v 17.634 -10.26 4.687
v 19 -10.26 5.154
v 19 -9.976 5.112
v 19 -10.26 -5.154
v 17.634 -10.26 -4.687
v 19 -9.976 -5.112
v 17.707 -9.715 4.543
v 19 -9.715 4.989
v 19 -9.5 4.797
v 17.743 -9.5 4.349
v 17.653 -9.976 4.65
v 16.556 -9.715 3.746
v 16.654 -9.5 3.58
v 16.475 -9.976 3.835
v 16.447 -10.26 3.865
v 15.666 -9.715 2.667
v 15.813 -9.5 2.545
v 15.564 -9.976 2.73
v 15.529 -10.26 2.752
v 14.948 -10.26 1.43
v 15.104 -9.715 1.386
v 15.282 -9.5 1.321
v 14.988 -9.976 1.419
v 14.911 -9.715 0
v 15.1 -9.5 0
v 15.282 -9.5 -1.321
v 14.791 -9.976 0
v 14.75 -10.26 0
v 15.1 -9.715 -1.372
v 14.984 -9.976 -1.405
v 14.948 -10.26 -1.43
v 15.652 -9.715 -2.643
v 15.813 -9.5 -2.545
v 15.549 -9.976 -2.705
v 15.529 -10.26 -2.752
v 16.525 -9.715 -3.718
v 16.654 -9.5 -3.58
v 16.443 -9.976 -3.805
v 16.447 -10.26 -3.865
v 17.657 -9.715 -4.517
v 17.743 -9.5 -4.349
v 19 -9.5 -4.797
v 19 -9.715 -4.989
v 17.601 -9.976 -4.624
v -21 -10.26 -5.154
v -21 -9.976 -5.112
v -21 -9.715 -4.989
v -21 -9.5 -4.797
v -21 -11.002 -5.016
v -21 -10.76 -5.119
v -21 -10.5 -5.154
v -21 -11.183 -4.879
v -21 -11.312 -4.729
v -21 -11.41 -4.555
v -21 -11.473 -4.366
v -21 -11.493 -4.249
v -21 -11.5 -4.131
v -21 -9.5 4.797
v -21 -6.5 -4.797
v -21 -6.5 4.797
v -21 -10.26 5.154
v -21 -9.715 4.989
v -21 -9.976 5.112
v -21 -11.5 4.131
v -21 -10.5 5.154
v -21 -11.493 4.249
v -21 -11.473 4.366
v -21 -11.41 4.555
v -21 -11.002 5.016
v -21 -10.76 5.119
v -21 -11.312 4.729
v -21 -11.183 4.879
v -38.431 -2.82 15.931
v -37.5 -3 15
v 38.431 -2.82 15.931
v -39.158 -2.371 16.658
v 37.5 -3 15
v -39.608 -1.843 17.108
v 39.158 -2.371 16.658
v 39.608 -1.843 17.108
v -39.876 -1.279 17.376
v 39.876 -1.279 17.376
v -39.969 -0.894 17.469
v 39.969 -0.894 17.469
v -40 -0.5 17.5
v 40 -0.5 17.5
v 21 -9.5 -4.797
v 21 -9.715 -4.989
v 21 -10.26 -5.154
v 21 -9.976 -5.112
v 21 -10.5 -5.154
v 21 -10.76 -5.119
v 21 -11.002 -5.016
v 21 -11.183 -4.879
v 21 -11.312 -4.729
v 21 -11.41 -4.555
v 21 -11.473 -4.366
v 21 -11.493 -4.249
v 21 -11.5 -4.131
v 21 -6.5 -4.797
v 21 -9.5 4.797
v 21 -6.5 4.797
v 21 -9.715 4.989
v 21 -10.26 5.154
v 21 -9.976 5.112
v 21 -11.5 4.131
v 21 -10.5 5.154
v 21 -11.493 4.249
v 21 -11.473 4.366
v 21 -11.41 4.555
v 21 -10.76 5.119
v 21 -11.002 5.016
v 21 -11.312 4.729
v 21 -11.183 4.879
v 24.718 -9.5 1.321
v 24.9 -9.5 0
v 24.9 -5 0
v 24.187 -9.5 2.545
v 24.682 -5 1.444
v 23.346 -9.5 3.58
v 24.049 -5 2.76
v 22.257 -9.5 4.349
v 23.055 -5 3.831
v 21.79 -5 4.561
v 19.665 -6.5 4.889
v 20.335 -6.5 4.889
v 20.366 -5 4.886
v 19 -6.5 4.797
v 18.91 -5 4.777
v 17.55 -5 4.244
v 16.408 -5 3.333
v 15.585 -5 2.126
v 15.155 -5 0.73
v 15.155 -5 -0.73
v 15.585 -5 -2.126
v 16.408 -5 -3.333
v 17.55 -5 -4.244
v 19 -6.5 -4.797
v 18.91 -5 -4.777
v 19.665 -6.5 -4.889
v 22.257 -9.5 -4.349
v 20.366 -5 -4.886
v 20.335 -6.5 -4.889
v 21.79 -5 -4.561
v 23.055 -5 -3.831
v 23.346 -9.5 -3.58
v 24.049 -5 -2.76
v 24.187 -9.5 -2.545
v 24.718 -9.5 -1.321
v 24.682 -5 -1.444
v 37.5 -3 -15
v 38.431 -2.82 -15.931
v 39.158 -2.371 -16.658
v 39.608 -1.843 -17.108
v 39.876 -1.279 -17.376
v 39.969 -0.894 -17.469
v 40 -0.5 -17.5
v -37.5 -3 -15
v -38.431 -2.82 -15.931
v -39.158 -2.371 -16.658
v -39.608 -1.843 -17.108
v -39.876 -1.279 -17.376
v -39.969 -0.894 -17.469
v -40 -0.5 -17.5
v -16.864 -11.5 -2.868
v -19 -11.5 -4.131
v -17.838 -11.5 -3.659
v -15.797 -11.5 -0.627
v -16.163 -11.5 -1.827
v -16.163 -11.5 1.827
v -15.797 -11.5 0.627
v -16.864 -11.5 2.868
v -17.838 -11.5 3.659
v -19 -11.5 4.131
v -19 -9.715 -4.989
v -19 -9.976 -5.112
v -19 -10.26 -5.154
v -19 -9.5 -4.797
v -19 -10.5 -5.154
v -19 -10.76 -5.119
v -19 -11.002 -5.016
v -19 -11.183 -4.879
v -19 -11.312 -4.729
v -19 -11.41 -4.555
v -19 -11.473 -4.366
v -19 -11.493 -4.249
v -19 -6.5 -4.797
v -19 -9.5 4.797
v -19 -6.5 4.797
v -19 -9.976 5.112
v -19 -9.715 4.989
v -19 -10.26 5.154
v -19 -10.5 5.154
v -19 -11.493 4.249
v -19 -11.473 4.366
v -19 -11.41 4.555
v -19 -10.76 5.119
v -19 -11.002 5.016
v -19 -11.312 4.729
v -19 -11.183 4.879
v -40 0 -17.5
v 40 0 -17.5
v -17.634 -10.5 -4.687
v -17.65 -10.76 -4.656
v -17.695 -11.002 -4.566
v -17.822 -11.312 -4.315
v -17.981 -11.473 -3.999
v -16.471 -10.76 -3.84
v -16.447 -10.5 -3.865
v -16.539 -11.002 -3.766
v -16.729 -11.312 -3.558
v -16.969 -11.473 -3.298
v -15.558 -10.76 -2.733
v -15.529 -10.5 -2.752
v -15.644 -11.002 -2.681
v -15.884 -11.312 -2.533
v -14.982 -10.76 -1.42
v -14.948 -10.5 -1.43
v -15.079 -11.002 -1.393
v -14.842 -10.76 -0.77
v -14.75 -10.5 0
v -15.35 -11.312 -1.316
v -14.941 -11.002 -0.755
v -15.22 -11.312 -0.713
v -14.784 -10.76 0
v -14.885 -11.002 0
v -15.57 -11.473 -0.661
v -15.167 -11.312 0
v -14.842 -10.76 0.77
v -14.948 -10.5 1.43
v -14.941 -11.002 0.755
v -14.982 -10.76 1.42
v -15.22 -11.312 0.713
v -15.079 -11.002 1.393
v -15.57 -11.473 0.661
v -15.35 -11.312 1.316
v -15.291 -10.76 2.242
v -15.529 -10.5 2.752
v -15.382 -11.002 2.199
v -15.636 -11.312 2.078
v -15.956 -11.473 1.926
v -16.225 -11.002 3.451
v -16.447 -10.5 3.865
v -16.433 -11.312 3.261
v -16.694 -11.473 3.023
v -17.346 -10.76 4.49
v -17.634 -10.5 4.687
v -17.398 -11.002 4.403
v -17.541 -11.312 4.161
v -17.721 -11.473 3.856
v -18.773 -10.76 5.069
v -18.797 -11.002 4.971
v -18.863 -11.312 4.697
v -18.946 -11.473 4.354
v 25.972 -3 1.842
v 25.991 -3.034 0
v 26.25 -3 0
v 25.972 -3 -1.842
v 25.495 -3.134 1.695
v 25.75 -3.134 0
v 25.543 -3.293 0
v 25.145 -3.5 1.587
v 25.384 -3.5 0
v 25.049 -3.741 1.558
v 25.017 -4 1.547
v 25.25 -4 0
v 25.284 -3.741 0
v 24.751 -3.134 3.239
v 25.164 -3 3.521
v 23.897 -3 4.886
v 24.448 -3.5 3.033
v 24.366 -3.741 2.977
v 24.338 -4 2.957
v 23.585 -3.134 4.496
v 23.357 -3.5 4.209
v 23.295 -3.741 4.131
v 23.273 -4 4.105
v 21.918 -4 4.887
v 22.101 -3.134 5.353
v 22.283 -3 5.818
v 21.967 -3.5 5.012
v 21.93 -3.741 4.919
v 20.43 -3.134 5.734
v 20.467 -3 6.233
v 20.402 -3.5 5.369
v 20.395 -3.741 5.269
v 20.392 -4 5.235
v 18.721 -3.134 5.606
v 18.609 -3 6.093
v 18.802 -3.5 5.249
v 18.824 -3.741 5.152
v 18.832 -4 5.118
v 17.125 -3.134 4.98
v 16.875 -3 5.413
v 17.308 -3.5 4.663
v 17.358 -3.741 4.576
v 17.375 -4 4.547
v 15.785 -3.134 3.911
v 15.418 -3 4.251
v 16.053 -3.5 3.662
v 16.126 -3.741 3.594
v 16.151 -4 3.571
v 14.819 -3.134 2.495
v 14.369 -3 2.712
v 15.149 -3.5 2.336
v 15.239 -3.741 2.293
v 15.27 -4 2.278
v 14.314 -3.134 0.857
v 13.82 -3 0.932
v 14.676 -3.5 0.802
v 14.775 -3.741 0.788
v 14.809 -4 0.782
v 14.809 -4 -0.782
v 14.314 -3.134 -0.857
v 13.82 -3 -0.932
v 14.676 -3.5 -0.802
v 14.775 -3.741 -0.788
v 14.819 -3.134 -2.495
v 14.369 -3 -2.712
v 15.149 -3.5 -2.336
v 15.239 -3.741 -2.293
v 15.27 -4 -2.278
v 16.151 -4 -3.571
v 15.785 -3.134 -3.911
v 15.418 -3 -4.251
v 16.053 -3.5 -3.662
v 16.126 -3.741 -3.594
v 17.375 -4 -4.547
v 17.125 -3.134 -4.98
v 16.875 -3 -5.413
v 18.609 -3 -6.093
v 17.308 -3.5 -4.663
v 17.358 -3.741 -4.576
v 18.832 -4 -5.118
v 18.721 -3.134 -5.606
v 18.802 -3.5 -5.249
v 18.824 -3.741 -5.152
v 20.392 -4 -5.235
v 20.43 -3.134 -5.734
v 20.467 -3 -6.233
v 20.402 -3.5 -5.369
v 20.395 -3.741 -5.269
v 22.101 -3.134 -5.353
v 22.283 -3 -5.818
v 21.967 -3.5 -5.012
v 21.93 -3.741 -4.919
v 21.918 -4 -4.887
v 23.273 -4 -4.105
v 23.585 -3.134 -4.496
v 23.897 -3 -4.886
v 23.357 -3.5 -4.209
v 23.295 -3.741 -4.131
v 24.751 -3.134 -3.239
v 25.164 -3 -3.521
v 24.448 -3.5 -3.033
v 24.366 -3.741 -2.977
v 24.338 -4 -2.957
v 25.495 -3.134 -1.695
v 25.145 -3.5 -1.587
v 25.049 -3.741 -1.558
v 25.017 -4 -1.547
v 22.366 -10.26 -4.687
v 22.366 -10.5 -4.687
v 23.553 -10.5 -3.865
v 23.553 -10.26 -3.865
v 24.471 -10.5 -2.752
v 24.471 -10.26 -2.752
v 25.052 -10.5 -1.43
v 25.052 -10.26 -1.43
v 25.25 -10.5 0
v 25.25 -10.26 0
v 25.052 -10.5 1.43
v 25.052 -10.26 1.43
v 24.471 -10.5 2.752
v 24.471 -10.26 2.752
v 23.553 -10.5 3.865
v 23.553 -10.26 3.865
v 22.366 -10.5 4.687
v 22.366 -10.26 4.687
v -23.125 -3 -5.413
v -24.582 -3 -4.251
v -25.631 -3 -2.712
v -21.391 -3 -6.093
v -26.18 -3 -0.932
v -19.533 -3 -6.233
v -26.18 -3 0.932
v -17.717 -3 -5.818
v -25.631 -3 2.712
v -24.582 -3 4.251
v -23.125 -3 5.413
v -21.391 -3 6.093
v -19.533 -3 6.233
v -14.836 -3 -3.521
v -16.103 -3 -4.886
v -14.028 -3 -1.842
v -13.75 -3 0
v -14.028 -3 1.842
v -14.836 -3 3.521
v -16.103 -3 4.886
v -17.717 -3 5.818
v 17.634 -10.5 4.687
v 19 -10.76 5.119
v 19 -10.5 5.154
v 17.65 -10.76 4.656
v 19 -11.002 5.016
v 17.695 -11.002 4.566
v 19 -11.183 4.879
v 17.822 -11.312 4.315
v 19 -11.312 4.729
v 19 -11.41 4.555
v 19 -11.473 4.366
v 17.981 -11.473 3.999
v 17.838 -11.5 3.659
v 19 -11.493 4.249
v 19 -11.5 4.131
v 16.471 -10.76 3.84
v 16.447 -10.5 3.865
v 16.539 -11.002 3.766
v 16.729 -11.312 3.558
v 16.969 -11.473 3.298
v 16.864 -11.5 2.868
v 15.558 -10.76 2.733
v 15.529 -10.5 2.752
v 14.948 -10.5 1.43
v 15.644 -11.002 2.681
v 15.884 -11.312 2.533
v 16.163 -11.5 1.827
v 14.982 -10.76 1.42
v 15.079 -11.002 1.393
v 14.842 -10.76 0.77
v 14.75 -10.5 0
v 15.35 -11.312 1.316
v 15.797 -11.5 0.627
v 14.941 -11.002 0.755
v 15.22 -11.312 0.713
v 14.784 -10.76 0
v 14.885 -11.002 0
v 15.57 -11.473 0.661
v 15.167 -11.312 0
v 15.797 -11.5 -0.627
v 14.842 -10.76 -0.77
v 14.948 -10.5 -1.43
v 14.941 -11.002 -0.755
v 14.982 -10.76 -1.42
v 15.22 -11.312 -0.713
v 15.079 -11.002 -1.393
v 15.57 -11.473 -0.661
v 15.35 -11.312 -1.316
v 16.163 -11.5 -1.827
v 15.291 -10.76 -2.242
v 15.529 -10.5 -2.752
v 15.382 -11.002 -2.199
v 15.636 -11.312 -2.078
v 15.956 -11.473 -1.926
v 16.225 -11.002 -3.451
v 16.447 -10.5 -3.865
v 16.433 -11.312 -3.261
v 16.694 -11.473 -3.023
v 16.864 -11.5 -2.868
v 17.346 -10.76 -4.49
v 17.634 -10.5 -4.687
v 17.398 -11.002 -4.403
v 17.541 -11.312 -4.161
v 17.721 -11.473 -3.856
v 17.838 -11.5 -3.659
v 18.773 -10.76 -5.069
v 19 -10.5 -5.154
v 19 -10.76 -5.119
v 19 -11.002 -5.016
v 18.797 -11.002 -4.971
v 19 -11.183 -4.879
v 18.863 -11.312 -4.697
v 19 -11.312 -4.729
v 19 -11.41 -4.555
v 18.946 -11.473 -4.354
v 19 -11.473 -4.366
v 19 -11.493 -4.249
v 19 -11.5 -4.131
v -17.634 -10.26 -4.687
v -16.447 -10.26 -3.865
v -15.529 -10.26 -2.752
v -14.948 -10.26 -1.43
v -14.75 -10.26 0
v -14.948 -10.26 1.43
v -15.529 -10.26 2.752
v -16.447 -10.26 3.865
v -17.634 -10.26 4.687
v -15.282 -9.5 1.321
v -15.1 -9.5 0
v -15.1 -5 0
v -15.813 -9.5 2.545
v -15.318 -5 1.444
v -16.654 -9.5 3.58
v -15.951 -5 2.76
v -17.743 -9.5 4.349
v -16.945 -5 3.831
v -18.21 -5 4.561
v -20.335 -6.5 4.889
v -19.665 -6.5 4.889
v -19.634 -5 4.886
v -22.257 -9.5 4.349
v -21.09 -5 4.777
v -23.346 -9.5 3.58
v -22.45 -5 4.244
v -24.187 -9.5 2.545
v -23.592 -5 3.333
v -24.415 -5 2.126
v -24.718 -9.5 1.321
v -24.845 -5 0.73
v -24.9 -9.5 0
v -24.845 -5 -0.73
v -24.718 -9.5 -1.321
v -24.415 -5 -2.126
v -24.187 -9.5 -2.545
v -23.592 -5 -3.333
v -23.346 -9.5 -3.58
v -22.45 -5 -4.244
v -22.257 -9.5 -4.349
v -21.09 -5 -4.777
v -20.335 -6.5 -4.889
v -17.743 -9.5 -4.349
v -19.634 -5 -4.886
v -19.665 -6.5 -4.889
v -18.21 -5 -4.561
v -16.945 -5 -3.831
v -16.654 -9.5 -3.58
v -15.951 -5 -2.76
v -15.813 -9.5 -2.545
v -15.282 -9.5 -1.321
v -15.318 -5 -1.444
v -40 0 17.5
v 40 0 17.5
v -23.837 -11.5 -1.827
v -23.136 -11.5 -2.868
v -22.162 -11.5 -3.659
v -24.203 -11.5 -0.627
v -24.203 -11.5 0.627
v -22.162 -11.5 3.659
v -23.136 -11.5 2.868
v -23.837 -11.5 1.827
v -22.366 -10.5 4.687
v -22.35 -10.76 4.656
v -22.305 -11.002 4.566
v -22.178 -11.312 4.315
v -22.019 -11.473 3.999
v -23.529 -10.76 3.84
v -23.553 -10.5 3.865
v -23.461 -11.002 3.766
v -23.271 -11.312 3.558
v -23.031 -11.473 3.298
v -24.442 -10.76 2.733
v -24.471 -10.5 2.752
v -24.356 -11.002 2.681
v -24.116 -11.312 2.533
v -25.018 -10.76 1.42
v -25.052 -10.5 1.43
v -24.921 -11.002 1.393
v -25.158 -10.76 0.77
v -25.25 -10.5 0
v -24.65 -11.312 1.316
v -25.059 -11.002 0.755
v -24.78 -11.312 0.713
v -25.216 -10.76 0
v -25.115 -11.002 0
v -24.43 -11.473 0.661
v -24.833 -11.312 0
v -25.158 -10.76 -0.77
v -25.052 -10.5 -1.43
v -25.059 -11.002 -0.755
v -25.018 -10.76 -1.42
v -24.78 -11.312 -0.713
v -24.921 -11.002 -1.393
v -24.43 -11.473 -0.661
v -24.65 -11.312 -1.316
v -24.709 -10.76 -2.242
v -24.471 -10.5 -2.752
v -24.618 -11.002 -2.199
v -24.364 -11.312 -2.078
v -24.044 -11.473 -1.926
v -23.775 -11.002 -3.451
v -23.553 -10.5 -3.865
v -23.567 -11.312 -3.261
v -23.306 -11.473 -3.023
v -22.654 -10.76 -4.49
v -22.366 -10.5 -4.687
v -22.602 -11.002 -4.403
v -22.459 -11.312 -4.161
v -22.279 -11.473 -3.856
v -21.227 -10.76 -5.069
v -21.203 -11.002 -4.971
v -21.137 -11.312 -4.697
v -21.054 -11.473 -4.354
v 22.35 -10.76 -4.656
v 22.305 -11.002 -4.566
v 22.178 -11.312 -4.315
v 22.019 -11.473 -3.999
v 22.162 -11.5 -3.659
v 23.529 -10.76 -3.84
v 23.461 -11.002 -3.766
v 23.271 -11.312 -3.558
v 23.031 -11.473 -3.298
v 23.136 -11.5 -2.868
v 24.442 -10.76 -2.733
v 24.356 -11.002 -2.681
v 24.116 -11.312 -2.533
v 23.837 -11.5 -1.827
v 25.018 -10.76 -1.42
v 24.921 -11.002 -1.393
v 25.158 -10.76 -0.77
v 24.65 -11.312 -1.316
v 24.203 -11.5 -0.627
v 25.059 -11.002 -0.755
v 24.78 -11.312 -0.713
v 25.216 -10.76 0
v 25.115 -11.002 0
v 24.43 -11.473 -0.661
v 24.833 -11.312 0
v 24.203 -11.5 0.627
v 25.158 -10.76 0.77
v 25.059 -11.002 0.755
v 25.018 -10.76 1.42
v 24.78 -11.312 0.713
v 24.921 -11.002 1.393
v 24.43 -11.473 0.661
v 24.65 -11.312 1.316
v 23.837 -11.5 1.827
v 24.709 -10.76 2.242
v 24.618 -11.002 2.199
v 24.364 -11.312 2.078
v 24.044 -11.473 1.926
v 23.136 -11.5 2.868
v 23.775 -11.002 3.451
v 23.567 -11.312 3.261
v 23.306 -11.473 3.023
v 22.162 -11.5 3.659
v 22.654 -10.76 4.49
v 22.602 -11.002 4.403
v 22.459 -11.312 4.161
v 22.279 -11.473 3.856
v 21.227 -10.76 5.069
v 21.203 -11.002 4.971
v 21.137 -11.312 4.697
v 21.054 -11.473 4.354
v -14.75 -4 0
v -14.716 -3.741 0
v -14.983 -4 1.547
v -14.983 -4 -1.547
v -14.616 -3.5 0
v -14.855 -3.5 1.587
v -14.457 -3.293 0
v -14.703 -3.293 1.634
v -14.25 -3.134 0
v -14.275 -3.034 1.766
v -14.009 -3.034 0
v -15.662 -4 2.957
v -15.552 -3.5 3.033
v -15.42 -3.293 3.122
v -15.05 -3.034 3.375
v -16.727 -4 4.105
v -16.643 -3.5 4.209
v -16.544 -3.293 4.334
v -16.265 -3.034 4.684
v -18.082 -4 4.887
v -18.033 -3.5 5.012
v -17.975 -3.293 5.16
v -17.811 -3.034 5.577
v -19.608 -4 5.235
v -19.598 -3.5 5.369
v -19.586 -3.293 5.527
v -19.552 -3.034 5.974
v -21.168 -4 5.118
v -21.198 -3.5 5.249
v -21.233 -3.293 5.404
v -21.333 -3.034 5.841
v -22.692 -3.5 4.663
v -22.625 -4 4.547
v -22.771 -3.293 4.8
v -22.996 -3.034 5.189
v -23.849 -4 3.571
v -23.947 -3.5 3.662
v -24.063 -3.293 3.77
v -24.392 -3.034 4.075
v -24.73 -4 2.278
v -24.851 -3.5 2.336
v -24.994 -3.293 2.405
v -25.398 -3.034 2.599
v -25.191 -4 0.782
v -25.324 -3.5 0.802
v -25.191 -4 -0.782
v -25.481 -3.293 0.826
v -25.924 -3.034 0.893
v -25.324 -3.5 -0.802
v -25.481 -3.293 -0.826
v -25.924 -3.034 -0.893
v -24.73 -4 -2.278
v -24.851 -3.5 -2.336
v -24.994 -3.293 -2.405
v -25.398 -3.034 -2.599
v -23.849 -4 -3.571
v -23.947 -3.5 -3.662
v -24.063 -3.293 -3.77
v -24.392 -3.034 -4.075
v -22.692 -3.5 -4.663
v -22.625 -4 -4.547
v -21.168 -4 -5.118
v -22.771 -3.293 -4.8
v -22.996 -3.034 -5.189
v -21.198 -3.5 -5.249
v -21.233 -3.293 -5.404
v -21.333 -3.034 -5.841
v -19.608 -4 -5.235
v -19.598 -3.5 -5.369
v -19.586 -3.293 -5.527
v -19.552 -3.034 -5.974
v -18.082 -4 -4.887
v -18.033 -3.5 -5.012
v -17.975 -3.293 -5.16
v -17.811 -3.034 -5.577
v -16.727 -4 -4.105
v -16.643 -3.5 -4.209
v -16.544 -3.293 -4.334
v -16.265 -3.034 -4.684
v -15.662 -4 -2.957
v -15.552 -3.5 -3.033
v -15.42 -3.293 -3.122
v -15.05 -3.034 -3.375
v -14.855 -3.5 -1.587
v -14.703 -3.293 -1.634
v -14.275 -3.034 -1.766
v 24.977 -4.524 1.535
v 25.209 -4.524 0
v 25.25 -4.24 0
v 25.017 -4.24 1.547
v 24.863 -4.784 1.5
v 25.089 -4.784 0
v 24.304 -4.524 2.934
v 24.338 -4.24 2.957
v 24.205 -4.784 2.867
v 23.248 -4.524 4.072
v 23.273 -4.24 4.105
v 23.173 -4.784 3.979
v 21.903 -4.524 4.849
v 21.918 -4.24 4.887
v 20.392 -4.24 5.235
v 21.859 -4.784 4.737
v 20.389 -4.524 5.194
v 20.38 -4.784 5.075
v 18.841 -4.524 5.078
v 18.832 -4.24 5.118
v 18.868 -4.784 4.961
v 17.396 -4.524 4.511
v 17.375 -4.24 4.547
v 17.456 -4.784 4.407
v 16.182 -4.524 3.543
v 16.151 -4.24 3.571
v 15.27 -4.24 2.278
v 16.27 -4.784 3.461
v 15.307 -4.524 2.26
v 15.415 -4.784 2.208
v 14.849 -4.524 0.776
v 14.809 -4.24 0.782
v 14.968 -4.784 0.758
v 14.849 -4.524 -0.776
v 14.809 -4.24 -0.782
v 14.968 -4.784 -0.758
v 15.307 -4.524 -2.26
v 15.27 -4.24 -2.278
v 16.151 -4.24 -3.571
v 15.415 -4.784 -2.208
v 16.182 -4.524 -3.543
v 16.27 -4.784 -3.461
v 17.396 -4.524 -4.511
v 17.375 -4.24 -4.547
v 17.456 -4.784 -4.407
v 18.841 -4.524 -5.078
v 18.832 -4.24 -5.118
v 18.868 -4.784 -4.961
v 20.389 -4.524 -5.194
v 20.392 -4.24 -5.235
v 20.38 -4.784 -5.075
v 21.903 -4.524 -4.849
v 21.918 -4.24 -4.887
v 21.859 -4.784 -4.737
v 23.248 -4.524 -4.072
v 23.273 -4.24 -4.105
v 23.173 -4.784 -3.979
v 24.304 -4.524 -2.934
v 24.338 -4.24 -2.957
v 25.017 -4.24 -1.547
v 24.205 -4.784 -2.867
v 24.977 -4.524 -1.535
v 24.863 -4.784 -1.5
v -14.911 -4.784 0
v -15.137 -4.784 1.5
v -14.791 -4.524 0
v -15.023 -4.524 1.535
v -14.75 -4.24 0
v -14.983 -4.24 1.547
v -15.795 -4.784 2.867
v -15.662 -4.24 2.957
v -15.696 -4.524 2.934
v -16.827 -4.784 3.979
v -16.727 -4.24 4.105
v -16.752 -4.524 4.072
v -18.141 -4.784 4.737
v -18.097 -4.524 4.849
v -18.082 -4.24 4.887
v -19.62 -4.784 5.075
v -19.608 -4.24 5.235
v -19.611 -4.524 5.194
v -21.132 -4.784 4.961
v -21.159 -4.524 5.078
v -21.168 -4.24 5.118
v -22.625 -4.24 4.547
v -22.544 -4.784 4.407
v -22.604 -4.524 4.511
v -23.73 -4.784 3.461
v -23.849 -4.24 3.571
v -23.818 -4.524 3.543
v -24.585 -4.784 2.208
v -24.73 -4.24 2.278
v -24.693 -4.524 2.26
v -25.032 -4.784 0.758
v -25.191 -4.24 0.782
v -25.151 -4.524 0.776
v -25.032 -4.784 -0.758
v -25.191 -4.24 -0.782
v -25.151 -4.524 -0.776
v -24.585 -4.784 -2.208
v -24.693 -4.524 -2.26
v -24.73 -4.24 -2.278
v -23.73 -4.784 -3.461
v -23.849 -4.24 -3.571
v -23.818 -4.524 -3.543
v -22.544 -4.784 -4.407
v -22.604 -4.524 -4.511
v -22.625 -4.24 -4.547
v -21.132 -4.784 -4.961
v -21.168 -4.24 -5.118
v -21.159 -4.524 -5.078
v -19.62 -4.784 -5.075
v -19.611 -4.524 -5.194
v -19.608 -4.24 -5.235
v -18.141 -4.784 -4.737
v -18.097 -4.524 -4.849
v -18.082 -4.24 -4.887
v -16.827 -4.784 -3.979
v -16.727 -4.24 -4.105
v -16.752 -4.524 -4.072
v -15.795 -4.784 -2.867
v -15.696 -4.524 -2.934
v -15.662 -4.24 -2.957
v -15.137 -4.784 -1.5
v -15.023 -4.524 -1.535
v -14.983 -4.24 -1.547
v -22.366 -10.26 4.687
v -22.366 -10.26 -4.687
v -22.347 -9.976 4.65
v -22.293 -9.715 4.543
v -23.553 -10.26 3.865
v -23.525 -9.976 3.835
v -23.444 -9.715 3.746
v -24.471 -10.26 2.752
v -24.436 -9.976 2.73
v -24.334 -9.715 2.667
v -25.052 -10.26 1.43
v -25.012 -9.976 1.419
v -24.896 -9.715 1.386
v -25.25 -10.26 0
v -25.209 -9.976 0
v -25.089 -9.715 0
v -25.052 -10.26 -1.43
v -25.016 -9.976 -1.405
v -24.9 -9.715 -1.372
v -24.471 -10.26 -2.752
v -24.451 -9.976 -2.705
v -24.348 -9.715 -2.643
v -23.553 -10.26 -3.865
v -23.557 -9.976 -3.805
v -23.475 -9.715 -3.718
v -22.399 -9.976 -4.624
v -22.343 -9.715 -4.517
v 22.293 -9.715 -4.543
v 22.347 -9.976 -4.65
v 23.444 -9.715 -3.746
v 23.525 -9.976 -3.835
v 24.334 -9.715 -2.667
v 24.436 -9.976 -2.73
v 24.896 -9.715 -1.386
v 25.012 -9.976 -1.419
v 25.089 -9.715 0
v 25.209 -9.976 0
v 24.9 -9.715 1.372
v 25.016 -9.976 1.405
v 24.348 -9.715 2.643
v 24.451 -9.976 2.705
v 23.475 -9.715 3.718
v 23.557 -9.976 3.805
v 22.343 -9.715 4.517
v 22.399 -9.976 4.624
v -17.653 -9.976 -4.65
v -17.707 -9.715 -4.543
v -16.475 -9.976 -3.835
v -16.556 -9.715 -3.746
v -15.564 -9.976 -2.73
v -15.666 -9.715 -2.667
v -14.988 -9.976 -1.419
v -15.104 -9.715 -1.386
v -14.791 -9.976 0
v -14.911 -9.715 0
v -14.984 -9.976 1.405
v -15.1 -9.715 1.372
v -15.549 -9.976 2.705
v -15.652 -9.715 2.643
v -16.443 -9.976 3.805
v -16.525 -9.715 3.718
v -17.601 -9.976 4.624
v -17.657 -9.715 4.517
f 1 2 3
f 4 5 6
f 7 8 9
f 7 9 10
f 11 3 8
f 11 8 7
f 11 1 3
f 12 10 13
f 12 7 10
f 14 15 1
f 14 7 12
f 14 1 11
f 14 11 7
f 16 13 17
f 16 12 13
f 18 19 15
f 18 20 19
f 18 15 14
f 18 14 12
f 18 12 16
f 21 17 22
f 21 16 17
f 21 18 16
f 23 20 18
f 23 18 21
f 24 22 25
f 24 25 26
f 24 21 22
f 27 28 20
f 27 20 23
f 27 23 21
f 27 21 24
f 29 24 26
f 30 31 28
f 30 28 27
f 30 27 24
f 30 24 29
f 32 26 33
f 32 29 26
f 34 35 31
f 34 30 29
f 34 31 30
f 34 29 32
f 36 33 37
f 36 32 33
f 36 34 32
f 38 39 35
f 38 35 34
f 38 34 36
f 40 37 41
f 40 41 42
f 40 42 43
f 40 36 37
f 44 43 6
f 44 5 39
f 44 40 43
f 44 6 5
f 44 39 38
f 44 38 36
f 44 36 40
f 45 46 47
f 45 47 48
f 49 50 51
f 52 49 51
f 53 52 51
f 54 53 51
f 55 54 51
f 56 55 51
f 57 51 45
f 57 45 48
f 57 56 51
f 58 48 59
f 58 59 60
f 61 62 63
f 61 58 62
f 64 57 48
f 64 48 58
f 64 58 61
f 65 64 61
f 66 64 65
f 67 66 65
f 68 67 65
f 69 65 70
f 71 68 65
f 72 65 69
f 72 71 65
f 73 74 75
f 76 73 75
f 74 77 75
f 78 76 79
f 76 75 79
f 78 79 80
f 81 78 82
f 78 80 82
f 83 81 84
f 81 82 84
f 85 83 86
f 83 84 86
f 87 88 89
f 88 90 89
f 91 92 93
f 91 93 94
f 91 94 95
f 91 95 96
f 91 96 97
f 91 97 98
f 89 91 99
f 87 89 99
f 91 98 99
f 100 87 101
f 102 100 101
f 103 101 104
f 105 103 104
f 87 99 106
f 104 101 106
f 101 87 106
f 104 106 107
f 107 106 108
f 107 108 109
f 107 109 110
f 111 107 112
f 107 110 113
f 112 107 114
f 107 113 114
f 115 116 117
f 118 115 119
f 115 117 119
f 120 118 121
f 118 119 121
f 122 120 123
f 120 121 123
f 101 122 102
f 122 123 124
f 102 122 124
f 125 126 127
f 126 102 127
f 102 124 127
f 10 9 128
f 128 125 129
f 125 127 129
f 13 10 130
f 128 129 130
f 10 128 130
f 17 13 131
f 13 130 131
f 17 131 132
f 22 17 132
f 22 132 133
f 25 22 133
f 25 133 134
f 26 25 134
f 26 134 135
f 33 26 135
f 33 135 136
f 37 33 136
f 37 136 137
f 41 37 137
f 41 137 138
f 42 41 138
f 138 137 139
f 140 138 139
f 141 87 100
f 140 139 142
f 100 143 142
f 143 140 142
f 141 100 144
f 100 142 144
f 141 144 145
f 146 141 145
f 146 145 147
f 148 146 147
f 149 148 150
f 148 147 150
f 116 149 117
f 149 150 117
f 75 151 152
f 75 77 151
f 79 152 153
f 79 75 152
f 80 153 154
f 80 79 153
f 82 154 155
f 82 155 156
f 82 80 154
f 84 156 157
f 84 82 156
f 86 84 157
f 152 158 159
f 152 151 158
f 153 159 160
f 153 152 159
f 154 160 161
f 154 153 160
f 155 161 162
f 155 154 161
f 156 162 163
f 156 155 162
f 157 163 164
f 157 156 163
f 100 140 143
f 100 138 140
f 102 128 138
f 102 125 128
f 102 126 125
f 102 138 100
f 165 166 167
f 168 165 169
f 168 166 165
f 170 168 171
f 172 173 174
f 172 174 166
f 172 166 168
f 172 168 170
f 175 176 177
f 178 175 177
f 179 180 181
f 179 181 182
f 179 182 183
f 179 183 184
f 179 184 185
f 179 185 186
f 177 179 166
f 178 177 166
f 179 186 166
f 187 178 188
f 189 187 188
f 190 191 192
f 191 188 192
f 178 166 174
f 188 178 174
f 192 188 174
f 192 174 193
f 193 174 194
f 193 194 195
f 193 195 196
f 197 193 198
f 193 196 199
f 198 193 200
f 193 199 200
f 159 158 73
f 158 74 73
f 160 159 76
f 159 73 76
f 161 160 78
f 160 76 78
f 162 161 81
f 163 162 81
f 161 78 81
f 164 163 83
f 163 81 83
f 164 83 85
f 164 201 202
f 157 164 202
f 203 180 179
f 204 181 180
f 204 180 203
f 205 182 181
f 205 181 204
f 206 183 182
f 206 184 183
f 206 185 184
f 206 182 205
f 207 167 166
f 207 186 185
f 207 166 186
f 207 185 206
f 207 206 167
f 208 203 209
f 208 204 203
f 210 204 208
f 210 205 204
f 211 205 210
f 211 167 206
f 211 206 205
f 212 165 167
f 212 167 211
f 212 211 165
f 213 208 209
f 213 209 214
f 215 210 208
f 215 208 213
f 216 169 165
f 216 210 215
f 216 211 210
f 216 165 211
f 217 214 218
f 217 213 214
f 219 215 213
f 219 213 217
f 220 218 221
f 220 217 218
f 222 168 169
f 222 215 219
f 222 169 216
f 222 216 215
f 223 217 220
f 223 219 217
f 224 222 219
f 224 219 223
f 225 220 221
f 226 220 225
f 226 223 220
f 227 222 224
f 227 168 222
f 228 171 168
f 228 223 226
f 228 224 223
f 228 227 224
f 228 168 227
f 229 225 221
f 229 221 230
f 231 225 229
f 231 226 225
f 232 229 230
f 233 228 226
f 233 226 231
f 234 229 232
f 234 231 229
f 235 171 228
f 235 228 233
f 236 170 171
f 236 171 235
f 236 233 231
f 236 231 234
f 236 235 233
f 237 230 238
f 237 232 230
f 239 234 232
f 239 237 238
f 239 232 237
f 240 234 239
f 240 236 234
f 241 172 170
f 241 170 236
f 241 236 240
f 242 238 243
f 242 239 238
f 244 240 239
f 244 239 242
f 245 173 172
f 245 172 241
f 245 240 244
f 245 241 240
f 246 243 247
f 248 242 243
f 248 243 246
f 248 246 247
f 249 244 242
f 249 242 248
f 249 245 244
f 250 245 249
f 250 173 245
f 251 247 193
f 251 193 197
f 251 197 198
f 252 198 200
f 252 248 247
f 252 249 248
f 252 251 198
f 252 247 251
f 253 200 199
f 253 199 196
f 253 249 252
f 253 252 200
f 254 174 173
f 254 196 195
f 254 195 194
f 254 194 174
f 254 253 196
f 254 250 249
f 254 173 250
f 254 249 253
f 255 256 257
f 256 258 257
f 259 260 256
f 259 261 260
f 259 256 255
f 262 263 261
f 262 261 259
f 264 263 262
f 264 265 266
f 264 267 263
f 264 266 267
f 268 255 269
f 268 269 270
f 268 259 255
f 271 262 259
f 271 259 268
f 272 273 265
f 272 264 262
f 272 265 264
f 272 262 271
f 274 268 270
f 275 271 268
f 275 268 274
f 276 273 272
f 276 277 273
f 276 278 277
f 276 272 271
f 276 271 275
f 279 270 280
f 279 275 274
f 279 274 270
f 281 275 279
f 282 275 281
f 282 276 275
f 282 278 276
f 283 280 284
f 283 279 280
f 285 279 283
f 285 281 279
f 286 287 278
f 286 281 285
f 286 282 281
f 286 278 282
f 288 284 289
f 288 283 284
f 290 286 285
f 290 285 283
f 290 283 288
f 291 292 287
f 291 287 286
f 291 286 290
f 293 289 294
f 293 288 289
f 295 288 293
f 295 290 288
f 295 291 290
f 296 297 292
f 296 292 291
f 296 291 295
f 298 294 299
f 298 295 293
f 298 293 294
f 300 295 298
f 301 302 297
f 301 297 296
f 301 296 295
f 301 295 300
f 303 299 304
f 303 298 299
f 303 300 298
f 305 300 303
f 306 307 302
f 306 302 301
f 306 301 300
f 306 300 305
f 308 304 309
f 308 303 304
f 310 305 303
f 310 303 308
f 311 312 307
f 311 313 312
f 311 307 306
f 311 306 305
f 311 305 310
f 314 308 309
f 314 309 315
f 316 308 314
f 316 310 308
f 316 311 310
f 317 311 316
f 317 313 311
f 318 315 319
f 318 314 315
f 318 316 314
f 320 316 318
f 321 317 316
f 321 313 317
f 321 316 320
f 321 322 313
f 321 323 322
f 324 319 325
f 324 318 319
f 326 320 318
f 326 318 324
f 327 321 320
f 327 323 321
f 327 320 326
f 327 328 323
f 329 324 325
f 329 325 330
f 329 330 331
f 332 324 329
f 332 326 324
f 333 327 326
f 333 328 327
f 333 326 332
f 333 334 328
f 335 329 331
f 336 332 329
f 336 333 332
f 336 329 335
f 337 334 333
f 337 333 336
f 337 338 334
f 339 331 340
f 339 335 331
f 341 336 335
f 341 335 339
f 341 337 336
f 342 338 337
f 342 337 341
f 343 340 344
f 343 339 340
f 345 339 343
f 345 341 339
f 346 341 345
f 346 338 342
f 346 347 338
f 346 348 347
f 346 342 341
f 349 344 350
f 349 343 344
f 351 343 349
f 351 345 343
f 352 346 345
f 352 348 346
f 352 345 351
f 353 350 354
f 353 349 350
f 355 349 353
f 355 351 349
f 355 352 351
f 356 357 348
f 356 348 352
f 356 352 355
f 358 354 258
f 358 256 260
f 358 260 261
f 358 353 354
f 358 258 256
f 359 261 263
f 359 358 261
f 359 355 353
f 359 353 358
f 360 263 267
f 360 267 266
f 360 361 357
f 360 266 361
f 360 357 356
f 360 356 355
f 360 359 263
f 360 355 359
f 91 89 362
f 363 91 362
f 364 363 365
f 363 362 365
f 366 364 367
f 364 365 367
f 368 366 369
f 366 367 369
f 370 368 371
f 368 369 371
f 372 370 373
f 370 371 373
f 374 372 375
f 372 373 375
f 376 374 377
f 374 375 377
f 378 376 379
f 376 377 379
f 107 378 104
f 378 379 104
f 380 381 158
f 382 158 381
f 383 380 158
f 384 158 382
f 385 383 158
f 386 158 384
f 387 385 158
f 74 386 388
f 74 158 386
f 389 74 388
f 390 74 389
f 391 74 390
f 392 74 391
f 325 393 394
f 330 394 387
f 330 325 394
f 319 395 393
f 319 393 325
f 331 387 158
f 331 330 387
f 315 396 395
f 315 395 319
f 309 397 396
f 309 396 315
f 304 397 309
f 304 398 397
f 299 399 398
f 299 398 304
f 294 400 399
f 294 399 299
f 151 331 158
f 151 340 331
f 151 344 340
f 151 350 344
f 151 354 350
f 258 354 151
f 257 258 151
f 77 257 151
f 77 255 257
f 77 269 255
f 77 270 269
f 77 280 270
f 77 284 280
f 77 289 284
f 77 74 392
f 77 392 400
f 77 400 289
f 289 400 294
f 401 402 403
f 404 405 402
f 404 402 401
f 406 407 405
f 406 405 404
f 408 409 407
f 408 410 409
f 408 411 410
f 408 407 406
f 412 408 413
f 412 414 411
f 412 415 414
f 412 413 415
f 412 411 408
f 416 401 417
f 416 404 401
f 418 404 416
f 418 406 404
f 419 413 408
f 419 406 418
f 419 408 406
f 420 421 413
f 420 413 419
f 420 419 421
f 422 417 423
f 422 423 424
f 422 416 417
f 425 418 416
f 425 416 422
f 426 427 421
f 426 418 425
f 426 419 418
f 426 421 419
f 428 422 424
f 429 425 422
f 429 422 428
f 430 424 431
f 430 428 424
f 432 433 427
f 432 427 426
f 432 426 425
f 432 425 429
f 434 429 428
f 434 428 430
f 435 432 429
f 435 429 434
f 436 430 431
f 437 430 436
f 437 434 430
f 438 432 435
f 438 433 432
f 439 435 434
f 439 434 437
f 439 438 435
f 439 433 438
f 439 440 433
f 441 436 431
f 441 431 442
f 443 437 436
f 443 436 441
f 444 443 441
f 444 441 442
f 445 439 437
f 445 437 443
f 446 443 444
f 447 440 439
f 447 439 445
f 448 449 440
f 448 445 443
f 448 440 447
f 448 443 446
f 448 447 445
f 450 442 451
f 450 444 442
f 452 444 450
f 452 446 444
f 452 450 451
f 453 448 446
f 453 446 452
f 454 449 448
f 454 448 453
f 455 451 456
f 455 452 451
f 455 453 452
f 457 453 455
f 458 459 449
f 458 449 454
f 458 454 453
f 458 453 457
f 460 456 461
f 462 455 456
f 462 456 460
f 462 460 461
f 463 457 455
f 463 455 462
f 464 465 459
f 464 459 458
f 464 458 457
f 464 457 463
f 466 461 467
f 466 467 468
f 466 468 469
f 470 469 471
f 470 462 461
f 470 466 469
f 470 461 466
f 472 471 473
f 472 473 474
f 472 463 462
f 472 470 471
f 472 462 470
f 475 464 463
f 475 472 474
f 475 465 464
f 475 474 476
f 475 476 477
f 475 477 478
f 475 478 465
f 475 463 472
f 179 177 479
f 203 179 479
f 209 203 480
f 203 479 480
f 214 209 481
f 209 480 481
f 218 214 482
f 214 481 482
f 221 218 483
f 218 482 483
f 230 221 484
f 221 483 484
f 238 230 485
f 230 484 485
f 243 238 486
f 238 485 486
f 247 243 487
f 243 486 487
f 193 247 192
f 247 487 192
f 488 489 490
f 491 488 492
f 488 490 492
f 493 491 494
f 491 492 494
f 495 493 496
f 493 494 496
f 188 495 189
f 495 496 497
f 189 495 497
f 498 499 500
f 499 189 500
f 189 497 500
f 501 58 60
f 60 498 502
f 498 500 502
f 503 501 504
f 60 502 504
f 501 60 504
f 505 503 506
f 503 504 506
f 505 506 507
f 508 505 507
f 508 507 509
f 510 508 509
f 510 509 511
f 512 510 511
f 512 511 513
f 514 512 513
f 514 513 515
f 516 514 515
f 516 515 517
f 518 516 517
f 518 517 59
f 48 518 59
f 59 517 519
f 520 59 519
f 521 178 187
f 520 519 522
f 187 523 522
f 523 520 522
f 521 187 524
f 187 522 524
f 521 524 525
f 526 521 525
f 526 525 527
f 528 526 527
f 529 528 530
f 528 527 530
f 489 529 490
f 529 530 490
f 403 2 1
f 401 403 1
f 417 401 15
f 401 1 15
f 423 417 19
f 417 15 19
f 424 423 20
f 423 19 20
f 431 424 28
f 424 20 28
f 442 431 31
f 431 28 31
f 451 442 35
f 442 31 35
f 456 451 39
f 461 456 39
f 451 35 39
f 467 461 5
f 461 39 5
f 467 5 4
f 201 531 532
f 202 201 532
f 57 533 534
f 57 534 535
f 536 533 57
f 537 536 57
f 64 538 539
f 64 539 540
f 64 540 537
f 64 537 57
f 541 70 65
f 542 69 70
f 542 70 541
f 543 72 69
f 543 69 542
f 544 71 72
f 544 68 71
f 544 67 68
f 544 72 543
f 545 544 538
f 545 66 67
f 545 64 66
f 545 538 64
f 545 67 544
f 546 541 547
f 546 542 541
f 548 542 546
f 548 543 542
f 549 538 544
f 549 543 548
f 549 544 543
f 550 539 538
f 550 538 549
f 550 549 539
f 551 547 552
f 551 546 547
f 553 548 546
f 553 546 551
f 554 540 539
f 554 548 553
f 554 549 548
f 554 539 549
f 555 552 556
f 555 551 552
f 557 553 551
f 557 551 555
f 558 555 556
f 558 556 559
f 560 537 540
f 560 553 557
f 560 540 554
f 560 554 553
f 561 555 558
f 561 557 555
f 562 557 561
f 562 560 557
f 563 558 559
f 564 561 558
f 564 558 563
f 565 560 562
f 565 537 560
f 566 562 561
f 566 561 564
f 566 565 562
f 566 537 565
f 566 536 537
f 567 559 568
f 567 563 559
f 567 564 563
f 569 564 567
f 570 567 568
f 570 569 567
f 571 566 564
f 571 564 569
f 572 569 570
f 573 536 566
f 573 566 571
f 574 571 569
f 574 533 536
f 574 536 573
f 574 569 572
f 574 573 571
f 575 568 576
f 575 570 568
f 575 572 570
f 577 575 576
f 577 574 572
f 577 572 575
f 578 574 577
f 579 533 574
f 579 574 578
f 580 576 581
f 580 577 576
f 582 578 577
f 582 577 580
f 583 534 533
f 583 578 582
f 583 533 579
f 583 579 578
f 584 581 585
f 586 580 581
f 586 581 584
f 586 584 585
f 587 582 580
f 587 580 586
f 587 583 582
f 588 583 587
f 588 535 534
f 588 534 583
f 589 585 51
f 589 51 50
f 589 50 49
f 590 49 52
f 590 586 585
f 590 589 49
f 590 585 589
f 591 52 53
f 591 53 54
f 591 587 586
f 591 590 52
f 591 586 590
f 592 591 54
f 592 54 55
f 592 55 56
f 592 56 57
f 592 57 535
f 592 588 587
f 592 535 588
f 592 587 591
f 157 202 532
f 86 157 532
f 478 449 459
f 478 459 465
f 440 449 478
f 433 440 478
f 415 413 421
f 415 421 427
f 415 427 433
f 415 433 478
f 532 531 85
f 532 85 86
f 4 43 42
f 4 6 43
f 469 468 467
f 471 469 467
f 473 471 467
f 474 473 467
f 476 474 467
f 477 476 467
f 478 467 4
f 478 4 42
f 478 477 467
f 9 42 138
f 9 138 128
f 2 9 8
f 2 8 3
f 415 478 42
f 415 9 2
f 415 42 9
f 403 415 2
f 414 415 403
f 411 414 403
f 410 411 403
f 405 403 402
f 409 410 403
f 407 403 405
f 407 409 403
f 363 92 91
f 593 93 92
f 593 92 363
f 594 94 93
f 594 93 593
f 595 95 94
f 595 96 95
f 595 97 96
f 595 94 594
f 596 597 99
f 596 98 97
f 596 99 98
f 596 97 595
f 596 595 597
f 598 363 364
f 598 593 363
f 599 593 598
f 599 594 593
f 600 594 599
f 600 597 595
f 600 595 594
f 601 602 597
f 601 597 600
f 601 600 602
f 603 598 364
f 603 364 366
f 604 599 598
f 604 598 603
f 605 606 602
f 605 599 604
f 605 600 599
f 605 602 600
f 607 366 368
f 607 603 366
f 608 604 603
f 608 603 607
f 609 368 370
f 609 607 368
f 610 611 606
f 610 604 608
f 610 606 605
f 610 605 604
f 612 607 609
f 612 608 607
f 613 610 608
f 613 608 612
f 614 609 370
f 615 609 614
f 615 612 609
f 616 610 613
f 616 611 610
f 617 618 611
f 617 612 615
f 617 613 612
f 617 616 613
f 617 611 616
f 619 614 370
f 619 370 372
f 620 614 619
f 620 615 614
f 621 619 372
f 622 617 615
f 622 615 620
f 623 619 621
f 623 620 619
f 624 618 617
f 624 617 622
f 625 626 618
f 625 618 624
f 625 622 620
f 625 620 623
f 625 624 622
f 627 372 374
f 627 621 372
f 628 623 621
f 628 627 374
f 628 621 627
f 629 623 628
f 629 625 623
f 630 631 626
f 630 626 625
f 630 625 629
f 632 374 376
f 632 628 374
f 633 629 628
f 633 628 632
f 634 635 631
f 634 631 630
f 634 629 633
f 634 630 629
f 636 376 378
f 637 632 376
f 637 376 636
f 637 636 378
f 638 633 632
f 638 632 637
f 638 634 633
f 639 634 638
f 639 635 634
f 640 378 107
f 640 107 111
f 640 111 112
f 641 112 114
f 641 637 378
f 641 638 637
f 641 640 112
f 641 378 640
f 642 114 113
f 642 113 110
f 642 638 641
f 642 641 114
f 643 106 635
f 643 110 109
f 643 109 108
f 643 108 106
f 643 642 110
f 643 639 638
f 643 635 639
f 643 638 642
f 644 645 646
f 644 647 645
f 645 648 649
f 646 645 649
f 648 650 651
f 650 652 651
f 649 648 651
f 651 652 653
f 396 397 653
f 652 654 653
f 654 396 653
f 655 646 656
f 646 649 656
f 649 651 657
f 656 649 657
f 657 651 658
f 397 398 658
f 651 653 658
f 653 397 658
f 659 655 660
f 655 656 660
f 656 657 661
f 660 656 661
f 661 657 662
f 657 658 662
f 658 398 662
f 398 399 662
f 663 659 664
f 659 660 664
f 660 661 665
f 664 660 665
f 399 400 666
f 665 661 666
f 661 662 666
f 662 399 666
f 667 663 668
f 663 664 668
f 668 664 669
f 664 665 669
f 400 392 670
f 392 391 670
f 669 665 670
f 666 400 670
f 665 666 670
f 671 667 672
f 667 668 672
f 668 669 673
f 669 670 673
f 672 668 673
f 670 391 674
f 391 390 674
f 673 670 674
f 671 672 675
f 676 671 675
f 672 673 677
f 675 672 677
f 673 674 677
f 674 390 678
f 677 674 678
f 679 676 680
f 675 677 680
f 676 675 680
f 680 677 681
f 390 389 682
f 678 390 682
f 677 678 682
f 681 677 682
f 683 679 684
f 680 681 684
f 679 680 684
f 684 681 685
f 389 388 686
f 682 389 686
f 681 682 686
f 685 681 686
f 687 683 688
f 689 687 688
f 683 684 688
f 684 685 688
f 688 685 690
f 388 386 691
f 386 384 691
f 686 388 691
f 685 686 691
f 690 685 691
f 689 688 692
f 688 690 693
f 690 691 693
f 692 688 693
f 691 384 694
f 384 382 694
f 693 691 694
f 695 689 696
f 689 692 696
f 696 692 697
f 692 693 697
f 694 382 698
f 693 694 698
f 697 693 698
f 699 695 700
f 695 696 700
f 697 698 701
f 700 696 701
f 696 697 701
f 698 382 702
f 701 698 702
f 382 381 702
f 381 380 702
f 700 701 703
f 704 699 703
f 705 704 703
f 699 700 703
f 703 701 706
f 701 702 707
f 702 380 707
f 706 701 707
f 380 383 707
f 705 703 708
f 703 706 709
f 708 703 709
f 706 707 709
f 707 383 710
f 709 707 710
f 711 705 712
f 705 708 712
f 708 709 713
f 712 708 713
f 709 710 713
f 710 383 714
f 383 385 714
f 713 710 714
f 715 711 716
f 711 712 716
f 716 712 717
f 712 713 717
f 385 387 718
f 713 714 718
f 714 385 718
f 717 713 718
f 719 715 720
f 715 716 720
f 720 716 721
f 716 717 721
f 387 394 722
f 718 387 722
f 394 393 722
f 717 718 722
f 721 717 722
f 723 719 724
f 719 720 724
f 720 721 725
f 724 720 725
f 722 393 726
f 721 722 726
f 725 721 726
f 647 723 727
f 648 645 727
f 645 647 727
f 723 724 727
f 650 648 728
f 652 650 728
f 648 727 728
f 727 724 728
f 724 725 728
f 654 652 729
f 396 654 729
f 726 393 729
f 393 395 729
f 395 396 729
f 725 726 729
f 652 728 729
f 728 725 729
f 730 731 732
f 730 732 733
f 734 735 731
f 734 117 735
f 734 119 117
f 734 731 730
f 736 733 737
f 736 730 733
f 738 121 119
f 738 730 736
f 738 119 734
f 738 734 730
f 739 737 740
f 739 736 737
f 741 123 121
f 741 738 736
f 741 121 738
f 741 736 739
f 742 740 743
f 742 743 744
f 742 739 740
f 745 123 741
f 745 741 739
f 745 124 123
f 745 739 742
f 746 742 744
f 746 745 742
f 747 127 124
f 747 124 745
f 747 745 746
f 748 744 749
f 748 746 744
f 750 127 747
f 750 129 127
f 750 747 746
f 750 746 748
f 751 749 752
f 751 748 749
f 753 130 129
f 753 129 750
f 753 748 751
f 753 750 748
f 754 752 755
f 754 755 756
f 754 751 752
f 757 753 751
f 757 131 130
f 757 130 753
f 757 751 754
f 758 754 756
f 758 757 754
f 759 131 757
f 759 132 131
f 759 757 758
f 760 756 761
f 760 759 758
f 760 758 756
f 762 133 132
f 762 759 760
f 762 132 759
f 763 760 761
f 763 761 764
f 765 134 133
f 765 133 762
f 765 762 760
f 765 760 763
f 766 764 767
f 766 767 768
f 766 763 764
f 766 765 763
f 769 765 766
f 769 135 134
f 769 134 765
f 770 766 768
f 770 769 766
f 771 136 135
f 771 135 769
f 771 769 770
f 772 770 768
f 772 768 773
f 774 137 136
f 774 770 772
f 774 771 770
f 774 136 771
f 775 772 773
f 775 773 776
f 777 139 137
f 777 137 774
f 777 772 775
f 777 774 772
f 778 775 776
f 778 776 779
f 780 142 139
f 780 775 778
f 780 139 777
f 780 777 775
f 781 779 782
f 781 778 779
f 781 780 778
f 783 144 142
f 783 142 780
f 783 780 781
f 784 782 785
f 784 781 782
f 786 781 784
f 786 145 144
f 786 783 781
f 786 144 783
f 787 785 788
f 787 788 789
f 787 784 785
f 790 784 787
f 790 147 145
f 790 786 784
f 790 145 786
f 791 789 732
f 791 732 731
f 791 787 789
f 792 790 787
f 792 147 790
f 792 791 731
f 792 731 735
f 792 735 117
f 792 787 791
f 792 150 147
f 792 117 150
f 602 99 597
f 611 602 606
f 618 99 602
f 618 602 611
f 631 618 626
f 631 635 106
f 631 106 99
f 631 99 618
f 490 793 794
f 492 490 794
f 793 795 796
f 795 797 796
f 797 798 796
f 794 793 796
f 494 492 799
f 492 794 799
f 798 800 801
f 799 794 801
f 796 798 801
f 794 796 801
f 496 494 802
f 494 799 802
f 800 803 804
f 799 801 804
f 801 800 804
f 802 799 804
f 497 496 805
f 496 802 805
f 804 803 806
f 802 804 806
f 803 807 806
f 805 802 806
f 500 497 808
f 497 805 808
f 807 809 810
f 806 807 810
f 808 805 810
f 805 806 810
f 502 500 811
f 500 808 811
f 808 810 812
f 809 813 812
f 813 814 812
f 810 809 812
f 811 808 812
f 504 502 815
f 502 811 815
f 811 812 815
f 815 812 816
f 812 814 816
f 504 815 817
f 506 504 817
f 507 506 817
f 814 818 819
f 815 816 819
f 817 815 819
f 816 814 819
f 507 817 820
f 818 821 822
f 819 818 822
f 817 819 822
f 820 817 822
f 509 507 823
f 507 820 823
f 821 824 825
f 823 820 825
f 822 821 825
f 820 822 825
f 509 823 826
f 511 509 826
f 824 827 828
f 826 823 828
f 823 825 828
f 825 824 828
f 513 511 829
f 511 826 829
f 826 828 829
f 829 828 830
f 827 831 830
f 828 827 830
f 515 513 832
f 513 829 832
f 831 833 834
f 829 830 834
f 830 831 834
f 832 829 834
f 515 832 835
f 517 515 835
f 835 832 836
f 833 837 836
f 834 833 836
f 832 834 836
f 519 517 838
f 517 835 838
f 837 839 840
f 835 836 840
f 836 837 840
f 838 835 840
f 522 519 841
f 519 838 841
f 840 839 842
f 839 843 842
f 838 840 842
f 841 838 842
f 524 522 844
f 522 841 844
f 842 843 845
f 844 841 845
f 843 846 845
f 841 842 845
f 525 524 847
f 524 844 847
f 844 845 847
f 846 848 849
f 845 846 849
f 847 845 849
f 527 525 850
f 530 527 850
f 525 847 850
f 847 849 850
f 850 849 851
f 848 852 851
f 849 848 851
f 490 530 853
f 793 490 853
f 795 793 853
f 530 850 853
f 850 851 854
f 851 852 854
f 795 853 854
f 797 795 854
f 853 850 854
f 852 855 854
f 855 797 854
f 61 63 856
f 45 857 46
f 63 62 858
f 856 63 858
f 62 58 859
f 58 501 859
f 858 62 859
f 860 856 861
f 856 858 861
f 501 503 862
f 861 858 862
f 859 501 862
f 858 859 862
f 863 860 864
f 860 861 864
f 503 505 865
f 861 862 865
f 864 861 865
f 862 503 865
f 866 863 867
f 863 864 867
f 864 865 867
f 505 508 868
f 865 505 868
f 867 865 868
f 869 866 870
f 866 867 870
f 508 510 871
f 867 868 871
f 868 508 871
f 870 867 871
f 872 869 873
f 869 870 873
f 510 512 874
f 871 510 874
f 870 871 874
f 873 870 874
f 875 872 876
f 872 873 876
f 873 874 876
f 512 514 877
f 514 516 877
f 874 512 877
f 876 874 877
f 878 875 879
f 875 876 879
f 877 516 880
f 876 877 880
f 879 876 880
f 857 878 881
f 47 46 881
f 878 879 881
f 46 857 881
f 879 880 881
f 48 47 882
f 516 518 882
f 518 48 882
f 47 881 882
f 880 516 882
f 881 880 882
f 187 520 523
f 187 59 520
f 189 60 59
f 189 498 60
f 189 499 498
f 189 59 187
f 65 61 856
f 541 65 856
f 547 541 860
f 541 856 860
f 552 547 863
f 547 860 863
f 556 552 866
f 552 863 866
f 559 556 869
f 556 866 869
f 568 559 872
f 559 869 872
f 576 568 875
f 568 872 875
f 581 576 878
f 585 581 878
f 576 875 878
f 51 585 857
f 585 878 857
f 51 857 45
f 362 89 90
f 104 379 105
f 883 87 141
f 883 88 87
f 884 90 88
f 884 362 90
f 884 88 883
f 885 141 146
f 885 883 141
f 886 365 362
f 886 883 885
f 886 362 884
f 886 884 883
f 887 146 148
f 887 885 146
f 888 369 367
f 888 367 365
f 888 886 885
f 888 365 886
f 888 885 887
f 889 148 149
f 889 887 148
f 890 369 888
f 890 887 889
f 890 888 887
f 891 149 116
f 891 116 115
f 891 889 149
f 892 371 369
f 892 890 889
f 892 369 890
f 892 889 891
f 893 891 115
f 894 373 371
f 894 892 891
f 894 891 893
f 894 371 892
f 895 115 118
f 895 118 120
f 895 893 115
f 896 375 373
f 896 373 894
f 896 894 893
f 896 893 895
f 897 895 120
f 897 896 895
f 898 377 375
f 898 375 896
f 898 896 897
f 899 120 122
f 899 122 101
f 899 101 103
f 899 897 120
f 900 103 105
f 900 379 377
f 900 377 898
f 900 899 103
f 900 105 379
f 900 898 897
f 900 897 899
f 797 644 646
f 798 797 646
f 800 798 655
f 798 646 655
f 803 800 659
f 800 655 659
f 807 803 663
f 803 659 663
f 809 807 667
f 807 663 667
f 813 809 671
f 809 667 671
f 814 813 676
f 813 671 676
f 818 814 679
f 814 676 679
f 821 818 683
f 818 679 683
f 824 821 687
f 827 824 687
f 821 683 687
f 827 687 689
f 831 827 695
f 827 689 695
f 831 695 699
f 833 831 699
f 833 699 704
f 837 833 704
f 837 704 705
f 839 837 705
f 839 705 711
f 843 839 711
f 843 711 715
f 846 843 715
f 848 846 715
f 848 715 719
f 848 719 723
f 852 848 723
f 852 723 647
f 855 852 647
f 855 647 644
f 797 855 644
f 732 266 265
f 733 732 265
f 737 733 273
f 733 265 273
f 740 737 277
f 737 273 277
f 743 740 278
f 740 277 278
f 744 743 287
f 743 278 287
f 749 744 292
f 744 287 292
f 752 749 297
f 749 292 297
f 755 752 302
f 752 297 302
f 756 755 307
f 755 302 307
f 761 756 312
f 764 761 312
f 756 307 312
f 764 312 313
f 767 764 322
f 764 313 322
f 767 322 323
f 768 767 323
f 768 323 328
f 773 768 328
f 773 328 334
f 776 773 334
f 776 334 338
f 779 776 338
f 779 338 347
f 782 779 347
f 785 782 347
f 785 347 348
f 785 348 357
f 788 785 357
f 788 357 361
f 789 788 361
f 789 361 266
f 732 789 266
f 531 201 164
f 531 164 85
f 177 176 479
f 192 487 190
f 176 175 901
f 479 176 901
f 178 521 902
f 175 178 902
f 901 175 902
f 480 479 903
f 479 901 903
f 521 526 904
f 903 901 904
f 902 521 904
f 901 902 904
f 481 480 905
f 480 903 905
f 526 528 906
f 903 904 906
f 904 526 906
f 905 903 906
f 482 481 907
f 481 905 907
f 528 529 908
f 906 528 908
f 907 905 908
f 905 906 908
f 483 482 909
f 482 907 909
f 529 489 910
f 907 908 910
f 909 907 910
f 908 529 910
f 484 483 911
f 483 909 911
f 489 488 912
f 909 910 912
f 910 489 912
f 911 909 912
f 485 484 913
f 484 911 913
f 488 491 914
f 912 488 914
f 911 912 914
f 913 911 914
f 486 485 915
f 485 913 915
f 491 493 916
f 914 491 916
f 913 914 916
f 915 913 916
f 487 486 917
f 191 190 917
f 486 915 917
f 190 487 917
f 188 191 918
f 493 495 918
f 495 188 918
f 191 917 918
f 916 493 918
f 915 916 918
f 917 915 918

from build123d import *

# Parameters (mm, degrees)
F0_W      = 80
F0_H      = 35
F1_DEPTH  = 3
F2_R      = 5.25
F3_DEPTH  = 2
F4_R      = 4.9
F5_DEPTH  = 4.5
F6_R      = 5.25
F7_DEPTH  = 2
F9_W      = 2
F9_H      = 15
F10_DEPTH = 5
F11_R     = 2.5


# Not quite as in the source:
# - a fillet or chamfer that OpenCascade refuses, or shapes differently, is made with other operations: its cross-section is extruded or revolved along the edge and cut away or added


with BuildPart() as f1:
    # F0 (on Front) → F1 (new body)
    with BuildSketch(Plane.XZ):
        Rectangle(F0_W, F0_H)
    extrude(amount=F1_DEPTH)

    # F2 (on face) → F3 (join)
    with BuildSketch(Plane.XZ.offset(3)):
        with Locations((-20, 0)):
            Circle(F2_R)
        with Locations((20, 0)):
            Circle(F2_R)
    extrude(amount=F3_DEPTH)

    # F4 (on face) → F5 (join)
    with BuildSketch(Plane.XZ.offset(5)):
        with Locations((-20, 0)):
            Circle(F4_R)
        with Locations((20, 0)):
            Circle(F4_R)
    extrude(amount=F5_DEPTH)

    # F6 (on face) → F7 (join)
    with BuildSketch(Plane.XZ.offset(9.5)):
        with Locations((-20, 0)):
            Circle(F6_R)
        with Locations((20, 0)):
            Circle(F6_R)
    extrude(amount=F7_DEPTH)

    # F8: fillet of radius 1 on 8 edges, made by hand

    # F8_s1 → F8_t2 (revolve)
    with BuildSketch(Plane.XY):
        with BuildLine():
            ThreePointArc((-14.75, -4), (-14.4571067812, -3.2928932188), (-13.75, -3))
            Line((-13.75, -3), (-14.75, -3))
            Line((-14.75, -3), (-14.75, -4))
        make_face()
    revolve(axis=Axis((-20, -3, 0), (0, -1, 0)))

    # F8_s3 → F8_t4 (revolve)
    with BuildSketch(Plane.XY):
        with BuildLine():
            ThreePointArc((26.25, -3), (25.5428932188, -3.2928932188), (25.25, -4))
            Line((25.25, -4), (25.25, -3))
            Line((25.25, -3), (26.25, -3))
        make_face()
    revolve(axis=Axis((20, -3, 0), (0, -1, 0)))

    # F8_s5 → F8_t6 (revolve, cut)
    with BuildSketch(Plane.XY):
        with BuildLine():
            ThreePointArc((-14.75, -10.2599342077), (-14.8417048938, -9.8416041944), (-15.1, -9.5))
            Line((-15.1, -9.5), (-14.75, -9.5))
            Line((-14.75, -9.5), (-14.75, -10.2599342077))
        make_face()
    revolve(axis=Axis((-20, -9.5, 0), (0, -1, 0)), mode=Mode.SUBTRACT)

    # F8_s7 → F8_t8 (revolve, cut)
    with BuildSketch(Plane.XY):
        with BuildLine():
            ThreePointArc((-14.75, -10.5), (-15.0428932188, -11.2071067812), (-15.75, -11.5))
            Line((-15.75, -11.5), (-14.75, -11.5))
            Line((-14.75, -11.5), (-14.75, -10.5))
        make_face()
    revolve(axis=Axis((-20, -11.5, 0), (0, -1, 0)), mode=Mode.SUBTRACT)

    # F8_s9 → F8_t10 (revolve, cut)
    with BuildSketch(Plane.XY):
        with BuildLine():
            ThreePointArc((-15.1, -5), (-14.8417048938, -4.6583958056), (-14.75, -4.2400657923))
            Line((-14.75, -4.2400657923), (-14.75, -5))
            Line((-14.75, -5), (-15.1, -5))
        make_face()
    revolve(axis=Axis((-20, -5, 0), (0, -1, 0)), mode=Mode.SUBTRACT)

    # F8_s11 → F8_t12 (revolve, cut)
    with BuildSketch(Plane.XY):
        with BuildLine():
            ThreePointArc((25.25, -4.2400657923), (25.1582951062, -4.6583958056), (24.9, -5))
            Line((24.9, -5), (25.25, -5))
            Line((25.25, -5), (25.25, -4.2400657923))
        make_face()
    revolve(axis=Axis((20, -5, 0), (0, -1, 0)), mode=Mode.SUBTRACT)

    # F8_s13 → F8_t14 (revolve, cut)
    with BuildSketch(Plane.XY):
        with BuildLine():
            ThreePointArc((24.9, -9.5), (25.1582951062, -9.8416041944), (25.25, -10.2599342077))
            Line((25.25, -10.2599342077), (25.25, -9.5))
            Line((25.25, -9.5), (24.9, -9.5))
        make_face()
    revolve(axis=Axis((20, -9.5, 0), (0, -1, 0)), mode=Mode.SUBTRACT)

    # F8_s15 → F8_t16 (revolve, cut)
    with BuildSketch(Plane.XY):
        with BuildLine():
            ThreePointArc((25.25, -10.5), (24.9571067812, -11.2071067812), (24.25, -11.5))
            Line((24.25, -11.5), (25.25, -11.5))
            Line((25.25, -11.5), (25.25, -10.5))
        make_face()
    revolve(axis=Axis((20, -11.5, 0), (0, -1, 0)), mode=Mode.SUBTRACT)

    # F9 (on face) → F10 (cut)
    with BuildSketch(Plane.XZ.offset(11.5)):
        with Locations((-20, 0)):
            Rectangle(F9_W, F9_H)
        with Locations((20, 0)):
            Rectangle(F9_W, F9_H)
    extrude(amount=-F10_DEPTH, mode=Mode.SUBTRACT)

    # F11
    f11_edges = [f1.edges().sort_by_distance(p)[0] for p in [
        (-40, -3, 0),
        (0, -3, 17.5),
        (40, -3, 0),
        (0, -3, -17.5),
    ]]
    fillet(f11_edges, radius=F11_R)


solid = f1.part
